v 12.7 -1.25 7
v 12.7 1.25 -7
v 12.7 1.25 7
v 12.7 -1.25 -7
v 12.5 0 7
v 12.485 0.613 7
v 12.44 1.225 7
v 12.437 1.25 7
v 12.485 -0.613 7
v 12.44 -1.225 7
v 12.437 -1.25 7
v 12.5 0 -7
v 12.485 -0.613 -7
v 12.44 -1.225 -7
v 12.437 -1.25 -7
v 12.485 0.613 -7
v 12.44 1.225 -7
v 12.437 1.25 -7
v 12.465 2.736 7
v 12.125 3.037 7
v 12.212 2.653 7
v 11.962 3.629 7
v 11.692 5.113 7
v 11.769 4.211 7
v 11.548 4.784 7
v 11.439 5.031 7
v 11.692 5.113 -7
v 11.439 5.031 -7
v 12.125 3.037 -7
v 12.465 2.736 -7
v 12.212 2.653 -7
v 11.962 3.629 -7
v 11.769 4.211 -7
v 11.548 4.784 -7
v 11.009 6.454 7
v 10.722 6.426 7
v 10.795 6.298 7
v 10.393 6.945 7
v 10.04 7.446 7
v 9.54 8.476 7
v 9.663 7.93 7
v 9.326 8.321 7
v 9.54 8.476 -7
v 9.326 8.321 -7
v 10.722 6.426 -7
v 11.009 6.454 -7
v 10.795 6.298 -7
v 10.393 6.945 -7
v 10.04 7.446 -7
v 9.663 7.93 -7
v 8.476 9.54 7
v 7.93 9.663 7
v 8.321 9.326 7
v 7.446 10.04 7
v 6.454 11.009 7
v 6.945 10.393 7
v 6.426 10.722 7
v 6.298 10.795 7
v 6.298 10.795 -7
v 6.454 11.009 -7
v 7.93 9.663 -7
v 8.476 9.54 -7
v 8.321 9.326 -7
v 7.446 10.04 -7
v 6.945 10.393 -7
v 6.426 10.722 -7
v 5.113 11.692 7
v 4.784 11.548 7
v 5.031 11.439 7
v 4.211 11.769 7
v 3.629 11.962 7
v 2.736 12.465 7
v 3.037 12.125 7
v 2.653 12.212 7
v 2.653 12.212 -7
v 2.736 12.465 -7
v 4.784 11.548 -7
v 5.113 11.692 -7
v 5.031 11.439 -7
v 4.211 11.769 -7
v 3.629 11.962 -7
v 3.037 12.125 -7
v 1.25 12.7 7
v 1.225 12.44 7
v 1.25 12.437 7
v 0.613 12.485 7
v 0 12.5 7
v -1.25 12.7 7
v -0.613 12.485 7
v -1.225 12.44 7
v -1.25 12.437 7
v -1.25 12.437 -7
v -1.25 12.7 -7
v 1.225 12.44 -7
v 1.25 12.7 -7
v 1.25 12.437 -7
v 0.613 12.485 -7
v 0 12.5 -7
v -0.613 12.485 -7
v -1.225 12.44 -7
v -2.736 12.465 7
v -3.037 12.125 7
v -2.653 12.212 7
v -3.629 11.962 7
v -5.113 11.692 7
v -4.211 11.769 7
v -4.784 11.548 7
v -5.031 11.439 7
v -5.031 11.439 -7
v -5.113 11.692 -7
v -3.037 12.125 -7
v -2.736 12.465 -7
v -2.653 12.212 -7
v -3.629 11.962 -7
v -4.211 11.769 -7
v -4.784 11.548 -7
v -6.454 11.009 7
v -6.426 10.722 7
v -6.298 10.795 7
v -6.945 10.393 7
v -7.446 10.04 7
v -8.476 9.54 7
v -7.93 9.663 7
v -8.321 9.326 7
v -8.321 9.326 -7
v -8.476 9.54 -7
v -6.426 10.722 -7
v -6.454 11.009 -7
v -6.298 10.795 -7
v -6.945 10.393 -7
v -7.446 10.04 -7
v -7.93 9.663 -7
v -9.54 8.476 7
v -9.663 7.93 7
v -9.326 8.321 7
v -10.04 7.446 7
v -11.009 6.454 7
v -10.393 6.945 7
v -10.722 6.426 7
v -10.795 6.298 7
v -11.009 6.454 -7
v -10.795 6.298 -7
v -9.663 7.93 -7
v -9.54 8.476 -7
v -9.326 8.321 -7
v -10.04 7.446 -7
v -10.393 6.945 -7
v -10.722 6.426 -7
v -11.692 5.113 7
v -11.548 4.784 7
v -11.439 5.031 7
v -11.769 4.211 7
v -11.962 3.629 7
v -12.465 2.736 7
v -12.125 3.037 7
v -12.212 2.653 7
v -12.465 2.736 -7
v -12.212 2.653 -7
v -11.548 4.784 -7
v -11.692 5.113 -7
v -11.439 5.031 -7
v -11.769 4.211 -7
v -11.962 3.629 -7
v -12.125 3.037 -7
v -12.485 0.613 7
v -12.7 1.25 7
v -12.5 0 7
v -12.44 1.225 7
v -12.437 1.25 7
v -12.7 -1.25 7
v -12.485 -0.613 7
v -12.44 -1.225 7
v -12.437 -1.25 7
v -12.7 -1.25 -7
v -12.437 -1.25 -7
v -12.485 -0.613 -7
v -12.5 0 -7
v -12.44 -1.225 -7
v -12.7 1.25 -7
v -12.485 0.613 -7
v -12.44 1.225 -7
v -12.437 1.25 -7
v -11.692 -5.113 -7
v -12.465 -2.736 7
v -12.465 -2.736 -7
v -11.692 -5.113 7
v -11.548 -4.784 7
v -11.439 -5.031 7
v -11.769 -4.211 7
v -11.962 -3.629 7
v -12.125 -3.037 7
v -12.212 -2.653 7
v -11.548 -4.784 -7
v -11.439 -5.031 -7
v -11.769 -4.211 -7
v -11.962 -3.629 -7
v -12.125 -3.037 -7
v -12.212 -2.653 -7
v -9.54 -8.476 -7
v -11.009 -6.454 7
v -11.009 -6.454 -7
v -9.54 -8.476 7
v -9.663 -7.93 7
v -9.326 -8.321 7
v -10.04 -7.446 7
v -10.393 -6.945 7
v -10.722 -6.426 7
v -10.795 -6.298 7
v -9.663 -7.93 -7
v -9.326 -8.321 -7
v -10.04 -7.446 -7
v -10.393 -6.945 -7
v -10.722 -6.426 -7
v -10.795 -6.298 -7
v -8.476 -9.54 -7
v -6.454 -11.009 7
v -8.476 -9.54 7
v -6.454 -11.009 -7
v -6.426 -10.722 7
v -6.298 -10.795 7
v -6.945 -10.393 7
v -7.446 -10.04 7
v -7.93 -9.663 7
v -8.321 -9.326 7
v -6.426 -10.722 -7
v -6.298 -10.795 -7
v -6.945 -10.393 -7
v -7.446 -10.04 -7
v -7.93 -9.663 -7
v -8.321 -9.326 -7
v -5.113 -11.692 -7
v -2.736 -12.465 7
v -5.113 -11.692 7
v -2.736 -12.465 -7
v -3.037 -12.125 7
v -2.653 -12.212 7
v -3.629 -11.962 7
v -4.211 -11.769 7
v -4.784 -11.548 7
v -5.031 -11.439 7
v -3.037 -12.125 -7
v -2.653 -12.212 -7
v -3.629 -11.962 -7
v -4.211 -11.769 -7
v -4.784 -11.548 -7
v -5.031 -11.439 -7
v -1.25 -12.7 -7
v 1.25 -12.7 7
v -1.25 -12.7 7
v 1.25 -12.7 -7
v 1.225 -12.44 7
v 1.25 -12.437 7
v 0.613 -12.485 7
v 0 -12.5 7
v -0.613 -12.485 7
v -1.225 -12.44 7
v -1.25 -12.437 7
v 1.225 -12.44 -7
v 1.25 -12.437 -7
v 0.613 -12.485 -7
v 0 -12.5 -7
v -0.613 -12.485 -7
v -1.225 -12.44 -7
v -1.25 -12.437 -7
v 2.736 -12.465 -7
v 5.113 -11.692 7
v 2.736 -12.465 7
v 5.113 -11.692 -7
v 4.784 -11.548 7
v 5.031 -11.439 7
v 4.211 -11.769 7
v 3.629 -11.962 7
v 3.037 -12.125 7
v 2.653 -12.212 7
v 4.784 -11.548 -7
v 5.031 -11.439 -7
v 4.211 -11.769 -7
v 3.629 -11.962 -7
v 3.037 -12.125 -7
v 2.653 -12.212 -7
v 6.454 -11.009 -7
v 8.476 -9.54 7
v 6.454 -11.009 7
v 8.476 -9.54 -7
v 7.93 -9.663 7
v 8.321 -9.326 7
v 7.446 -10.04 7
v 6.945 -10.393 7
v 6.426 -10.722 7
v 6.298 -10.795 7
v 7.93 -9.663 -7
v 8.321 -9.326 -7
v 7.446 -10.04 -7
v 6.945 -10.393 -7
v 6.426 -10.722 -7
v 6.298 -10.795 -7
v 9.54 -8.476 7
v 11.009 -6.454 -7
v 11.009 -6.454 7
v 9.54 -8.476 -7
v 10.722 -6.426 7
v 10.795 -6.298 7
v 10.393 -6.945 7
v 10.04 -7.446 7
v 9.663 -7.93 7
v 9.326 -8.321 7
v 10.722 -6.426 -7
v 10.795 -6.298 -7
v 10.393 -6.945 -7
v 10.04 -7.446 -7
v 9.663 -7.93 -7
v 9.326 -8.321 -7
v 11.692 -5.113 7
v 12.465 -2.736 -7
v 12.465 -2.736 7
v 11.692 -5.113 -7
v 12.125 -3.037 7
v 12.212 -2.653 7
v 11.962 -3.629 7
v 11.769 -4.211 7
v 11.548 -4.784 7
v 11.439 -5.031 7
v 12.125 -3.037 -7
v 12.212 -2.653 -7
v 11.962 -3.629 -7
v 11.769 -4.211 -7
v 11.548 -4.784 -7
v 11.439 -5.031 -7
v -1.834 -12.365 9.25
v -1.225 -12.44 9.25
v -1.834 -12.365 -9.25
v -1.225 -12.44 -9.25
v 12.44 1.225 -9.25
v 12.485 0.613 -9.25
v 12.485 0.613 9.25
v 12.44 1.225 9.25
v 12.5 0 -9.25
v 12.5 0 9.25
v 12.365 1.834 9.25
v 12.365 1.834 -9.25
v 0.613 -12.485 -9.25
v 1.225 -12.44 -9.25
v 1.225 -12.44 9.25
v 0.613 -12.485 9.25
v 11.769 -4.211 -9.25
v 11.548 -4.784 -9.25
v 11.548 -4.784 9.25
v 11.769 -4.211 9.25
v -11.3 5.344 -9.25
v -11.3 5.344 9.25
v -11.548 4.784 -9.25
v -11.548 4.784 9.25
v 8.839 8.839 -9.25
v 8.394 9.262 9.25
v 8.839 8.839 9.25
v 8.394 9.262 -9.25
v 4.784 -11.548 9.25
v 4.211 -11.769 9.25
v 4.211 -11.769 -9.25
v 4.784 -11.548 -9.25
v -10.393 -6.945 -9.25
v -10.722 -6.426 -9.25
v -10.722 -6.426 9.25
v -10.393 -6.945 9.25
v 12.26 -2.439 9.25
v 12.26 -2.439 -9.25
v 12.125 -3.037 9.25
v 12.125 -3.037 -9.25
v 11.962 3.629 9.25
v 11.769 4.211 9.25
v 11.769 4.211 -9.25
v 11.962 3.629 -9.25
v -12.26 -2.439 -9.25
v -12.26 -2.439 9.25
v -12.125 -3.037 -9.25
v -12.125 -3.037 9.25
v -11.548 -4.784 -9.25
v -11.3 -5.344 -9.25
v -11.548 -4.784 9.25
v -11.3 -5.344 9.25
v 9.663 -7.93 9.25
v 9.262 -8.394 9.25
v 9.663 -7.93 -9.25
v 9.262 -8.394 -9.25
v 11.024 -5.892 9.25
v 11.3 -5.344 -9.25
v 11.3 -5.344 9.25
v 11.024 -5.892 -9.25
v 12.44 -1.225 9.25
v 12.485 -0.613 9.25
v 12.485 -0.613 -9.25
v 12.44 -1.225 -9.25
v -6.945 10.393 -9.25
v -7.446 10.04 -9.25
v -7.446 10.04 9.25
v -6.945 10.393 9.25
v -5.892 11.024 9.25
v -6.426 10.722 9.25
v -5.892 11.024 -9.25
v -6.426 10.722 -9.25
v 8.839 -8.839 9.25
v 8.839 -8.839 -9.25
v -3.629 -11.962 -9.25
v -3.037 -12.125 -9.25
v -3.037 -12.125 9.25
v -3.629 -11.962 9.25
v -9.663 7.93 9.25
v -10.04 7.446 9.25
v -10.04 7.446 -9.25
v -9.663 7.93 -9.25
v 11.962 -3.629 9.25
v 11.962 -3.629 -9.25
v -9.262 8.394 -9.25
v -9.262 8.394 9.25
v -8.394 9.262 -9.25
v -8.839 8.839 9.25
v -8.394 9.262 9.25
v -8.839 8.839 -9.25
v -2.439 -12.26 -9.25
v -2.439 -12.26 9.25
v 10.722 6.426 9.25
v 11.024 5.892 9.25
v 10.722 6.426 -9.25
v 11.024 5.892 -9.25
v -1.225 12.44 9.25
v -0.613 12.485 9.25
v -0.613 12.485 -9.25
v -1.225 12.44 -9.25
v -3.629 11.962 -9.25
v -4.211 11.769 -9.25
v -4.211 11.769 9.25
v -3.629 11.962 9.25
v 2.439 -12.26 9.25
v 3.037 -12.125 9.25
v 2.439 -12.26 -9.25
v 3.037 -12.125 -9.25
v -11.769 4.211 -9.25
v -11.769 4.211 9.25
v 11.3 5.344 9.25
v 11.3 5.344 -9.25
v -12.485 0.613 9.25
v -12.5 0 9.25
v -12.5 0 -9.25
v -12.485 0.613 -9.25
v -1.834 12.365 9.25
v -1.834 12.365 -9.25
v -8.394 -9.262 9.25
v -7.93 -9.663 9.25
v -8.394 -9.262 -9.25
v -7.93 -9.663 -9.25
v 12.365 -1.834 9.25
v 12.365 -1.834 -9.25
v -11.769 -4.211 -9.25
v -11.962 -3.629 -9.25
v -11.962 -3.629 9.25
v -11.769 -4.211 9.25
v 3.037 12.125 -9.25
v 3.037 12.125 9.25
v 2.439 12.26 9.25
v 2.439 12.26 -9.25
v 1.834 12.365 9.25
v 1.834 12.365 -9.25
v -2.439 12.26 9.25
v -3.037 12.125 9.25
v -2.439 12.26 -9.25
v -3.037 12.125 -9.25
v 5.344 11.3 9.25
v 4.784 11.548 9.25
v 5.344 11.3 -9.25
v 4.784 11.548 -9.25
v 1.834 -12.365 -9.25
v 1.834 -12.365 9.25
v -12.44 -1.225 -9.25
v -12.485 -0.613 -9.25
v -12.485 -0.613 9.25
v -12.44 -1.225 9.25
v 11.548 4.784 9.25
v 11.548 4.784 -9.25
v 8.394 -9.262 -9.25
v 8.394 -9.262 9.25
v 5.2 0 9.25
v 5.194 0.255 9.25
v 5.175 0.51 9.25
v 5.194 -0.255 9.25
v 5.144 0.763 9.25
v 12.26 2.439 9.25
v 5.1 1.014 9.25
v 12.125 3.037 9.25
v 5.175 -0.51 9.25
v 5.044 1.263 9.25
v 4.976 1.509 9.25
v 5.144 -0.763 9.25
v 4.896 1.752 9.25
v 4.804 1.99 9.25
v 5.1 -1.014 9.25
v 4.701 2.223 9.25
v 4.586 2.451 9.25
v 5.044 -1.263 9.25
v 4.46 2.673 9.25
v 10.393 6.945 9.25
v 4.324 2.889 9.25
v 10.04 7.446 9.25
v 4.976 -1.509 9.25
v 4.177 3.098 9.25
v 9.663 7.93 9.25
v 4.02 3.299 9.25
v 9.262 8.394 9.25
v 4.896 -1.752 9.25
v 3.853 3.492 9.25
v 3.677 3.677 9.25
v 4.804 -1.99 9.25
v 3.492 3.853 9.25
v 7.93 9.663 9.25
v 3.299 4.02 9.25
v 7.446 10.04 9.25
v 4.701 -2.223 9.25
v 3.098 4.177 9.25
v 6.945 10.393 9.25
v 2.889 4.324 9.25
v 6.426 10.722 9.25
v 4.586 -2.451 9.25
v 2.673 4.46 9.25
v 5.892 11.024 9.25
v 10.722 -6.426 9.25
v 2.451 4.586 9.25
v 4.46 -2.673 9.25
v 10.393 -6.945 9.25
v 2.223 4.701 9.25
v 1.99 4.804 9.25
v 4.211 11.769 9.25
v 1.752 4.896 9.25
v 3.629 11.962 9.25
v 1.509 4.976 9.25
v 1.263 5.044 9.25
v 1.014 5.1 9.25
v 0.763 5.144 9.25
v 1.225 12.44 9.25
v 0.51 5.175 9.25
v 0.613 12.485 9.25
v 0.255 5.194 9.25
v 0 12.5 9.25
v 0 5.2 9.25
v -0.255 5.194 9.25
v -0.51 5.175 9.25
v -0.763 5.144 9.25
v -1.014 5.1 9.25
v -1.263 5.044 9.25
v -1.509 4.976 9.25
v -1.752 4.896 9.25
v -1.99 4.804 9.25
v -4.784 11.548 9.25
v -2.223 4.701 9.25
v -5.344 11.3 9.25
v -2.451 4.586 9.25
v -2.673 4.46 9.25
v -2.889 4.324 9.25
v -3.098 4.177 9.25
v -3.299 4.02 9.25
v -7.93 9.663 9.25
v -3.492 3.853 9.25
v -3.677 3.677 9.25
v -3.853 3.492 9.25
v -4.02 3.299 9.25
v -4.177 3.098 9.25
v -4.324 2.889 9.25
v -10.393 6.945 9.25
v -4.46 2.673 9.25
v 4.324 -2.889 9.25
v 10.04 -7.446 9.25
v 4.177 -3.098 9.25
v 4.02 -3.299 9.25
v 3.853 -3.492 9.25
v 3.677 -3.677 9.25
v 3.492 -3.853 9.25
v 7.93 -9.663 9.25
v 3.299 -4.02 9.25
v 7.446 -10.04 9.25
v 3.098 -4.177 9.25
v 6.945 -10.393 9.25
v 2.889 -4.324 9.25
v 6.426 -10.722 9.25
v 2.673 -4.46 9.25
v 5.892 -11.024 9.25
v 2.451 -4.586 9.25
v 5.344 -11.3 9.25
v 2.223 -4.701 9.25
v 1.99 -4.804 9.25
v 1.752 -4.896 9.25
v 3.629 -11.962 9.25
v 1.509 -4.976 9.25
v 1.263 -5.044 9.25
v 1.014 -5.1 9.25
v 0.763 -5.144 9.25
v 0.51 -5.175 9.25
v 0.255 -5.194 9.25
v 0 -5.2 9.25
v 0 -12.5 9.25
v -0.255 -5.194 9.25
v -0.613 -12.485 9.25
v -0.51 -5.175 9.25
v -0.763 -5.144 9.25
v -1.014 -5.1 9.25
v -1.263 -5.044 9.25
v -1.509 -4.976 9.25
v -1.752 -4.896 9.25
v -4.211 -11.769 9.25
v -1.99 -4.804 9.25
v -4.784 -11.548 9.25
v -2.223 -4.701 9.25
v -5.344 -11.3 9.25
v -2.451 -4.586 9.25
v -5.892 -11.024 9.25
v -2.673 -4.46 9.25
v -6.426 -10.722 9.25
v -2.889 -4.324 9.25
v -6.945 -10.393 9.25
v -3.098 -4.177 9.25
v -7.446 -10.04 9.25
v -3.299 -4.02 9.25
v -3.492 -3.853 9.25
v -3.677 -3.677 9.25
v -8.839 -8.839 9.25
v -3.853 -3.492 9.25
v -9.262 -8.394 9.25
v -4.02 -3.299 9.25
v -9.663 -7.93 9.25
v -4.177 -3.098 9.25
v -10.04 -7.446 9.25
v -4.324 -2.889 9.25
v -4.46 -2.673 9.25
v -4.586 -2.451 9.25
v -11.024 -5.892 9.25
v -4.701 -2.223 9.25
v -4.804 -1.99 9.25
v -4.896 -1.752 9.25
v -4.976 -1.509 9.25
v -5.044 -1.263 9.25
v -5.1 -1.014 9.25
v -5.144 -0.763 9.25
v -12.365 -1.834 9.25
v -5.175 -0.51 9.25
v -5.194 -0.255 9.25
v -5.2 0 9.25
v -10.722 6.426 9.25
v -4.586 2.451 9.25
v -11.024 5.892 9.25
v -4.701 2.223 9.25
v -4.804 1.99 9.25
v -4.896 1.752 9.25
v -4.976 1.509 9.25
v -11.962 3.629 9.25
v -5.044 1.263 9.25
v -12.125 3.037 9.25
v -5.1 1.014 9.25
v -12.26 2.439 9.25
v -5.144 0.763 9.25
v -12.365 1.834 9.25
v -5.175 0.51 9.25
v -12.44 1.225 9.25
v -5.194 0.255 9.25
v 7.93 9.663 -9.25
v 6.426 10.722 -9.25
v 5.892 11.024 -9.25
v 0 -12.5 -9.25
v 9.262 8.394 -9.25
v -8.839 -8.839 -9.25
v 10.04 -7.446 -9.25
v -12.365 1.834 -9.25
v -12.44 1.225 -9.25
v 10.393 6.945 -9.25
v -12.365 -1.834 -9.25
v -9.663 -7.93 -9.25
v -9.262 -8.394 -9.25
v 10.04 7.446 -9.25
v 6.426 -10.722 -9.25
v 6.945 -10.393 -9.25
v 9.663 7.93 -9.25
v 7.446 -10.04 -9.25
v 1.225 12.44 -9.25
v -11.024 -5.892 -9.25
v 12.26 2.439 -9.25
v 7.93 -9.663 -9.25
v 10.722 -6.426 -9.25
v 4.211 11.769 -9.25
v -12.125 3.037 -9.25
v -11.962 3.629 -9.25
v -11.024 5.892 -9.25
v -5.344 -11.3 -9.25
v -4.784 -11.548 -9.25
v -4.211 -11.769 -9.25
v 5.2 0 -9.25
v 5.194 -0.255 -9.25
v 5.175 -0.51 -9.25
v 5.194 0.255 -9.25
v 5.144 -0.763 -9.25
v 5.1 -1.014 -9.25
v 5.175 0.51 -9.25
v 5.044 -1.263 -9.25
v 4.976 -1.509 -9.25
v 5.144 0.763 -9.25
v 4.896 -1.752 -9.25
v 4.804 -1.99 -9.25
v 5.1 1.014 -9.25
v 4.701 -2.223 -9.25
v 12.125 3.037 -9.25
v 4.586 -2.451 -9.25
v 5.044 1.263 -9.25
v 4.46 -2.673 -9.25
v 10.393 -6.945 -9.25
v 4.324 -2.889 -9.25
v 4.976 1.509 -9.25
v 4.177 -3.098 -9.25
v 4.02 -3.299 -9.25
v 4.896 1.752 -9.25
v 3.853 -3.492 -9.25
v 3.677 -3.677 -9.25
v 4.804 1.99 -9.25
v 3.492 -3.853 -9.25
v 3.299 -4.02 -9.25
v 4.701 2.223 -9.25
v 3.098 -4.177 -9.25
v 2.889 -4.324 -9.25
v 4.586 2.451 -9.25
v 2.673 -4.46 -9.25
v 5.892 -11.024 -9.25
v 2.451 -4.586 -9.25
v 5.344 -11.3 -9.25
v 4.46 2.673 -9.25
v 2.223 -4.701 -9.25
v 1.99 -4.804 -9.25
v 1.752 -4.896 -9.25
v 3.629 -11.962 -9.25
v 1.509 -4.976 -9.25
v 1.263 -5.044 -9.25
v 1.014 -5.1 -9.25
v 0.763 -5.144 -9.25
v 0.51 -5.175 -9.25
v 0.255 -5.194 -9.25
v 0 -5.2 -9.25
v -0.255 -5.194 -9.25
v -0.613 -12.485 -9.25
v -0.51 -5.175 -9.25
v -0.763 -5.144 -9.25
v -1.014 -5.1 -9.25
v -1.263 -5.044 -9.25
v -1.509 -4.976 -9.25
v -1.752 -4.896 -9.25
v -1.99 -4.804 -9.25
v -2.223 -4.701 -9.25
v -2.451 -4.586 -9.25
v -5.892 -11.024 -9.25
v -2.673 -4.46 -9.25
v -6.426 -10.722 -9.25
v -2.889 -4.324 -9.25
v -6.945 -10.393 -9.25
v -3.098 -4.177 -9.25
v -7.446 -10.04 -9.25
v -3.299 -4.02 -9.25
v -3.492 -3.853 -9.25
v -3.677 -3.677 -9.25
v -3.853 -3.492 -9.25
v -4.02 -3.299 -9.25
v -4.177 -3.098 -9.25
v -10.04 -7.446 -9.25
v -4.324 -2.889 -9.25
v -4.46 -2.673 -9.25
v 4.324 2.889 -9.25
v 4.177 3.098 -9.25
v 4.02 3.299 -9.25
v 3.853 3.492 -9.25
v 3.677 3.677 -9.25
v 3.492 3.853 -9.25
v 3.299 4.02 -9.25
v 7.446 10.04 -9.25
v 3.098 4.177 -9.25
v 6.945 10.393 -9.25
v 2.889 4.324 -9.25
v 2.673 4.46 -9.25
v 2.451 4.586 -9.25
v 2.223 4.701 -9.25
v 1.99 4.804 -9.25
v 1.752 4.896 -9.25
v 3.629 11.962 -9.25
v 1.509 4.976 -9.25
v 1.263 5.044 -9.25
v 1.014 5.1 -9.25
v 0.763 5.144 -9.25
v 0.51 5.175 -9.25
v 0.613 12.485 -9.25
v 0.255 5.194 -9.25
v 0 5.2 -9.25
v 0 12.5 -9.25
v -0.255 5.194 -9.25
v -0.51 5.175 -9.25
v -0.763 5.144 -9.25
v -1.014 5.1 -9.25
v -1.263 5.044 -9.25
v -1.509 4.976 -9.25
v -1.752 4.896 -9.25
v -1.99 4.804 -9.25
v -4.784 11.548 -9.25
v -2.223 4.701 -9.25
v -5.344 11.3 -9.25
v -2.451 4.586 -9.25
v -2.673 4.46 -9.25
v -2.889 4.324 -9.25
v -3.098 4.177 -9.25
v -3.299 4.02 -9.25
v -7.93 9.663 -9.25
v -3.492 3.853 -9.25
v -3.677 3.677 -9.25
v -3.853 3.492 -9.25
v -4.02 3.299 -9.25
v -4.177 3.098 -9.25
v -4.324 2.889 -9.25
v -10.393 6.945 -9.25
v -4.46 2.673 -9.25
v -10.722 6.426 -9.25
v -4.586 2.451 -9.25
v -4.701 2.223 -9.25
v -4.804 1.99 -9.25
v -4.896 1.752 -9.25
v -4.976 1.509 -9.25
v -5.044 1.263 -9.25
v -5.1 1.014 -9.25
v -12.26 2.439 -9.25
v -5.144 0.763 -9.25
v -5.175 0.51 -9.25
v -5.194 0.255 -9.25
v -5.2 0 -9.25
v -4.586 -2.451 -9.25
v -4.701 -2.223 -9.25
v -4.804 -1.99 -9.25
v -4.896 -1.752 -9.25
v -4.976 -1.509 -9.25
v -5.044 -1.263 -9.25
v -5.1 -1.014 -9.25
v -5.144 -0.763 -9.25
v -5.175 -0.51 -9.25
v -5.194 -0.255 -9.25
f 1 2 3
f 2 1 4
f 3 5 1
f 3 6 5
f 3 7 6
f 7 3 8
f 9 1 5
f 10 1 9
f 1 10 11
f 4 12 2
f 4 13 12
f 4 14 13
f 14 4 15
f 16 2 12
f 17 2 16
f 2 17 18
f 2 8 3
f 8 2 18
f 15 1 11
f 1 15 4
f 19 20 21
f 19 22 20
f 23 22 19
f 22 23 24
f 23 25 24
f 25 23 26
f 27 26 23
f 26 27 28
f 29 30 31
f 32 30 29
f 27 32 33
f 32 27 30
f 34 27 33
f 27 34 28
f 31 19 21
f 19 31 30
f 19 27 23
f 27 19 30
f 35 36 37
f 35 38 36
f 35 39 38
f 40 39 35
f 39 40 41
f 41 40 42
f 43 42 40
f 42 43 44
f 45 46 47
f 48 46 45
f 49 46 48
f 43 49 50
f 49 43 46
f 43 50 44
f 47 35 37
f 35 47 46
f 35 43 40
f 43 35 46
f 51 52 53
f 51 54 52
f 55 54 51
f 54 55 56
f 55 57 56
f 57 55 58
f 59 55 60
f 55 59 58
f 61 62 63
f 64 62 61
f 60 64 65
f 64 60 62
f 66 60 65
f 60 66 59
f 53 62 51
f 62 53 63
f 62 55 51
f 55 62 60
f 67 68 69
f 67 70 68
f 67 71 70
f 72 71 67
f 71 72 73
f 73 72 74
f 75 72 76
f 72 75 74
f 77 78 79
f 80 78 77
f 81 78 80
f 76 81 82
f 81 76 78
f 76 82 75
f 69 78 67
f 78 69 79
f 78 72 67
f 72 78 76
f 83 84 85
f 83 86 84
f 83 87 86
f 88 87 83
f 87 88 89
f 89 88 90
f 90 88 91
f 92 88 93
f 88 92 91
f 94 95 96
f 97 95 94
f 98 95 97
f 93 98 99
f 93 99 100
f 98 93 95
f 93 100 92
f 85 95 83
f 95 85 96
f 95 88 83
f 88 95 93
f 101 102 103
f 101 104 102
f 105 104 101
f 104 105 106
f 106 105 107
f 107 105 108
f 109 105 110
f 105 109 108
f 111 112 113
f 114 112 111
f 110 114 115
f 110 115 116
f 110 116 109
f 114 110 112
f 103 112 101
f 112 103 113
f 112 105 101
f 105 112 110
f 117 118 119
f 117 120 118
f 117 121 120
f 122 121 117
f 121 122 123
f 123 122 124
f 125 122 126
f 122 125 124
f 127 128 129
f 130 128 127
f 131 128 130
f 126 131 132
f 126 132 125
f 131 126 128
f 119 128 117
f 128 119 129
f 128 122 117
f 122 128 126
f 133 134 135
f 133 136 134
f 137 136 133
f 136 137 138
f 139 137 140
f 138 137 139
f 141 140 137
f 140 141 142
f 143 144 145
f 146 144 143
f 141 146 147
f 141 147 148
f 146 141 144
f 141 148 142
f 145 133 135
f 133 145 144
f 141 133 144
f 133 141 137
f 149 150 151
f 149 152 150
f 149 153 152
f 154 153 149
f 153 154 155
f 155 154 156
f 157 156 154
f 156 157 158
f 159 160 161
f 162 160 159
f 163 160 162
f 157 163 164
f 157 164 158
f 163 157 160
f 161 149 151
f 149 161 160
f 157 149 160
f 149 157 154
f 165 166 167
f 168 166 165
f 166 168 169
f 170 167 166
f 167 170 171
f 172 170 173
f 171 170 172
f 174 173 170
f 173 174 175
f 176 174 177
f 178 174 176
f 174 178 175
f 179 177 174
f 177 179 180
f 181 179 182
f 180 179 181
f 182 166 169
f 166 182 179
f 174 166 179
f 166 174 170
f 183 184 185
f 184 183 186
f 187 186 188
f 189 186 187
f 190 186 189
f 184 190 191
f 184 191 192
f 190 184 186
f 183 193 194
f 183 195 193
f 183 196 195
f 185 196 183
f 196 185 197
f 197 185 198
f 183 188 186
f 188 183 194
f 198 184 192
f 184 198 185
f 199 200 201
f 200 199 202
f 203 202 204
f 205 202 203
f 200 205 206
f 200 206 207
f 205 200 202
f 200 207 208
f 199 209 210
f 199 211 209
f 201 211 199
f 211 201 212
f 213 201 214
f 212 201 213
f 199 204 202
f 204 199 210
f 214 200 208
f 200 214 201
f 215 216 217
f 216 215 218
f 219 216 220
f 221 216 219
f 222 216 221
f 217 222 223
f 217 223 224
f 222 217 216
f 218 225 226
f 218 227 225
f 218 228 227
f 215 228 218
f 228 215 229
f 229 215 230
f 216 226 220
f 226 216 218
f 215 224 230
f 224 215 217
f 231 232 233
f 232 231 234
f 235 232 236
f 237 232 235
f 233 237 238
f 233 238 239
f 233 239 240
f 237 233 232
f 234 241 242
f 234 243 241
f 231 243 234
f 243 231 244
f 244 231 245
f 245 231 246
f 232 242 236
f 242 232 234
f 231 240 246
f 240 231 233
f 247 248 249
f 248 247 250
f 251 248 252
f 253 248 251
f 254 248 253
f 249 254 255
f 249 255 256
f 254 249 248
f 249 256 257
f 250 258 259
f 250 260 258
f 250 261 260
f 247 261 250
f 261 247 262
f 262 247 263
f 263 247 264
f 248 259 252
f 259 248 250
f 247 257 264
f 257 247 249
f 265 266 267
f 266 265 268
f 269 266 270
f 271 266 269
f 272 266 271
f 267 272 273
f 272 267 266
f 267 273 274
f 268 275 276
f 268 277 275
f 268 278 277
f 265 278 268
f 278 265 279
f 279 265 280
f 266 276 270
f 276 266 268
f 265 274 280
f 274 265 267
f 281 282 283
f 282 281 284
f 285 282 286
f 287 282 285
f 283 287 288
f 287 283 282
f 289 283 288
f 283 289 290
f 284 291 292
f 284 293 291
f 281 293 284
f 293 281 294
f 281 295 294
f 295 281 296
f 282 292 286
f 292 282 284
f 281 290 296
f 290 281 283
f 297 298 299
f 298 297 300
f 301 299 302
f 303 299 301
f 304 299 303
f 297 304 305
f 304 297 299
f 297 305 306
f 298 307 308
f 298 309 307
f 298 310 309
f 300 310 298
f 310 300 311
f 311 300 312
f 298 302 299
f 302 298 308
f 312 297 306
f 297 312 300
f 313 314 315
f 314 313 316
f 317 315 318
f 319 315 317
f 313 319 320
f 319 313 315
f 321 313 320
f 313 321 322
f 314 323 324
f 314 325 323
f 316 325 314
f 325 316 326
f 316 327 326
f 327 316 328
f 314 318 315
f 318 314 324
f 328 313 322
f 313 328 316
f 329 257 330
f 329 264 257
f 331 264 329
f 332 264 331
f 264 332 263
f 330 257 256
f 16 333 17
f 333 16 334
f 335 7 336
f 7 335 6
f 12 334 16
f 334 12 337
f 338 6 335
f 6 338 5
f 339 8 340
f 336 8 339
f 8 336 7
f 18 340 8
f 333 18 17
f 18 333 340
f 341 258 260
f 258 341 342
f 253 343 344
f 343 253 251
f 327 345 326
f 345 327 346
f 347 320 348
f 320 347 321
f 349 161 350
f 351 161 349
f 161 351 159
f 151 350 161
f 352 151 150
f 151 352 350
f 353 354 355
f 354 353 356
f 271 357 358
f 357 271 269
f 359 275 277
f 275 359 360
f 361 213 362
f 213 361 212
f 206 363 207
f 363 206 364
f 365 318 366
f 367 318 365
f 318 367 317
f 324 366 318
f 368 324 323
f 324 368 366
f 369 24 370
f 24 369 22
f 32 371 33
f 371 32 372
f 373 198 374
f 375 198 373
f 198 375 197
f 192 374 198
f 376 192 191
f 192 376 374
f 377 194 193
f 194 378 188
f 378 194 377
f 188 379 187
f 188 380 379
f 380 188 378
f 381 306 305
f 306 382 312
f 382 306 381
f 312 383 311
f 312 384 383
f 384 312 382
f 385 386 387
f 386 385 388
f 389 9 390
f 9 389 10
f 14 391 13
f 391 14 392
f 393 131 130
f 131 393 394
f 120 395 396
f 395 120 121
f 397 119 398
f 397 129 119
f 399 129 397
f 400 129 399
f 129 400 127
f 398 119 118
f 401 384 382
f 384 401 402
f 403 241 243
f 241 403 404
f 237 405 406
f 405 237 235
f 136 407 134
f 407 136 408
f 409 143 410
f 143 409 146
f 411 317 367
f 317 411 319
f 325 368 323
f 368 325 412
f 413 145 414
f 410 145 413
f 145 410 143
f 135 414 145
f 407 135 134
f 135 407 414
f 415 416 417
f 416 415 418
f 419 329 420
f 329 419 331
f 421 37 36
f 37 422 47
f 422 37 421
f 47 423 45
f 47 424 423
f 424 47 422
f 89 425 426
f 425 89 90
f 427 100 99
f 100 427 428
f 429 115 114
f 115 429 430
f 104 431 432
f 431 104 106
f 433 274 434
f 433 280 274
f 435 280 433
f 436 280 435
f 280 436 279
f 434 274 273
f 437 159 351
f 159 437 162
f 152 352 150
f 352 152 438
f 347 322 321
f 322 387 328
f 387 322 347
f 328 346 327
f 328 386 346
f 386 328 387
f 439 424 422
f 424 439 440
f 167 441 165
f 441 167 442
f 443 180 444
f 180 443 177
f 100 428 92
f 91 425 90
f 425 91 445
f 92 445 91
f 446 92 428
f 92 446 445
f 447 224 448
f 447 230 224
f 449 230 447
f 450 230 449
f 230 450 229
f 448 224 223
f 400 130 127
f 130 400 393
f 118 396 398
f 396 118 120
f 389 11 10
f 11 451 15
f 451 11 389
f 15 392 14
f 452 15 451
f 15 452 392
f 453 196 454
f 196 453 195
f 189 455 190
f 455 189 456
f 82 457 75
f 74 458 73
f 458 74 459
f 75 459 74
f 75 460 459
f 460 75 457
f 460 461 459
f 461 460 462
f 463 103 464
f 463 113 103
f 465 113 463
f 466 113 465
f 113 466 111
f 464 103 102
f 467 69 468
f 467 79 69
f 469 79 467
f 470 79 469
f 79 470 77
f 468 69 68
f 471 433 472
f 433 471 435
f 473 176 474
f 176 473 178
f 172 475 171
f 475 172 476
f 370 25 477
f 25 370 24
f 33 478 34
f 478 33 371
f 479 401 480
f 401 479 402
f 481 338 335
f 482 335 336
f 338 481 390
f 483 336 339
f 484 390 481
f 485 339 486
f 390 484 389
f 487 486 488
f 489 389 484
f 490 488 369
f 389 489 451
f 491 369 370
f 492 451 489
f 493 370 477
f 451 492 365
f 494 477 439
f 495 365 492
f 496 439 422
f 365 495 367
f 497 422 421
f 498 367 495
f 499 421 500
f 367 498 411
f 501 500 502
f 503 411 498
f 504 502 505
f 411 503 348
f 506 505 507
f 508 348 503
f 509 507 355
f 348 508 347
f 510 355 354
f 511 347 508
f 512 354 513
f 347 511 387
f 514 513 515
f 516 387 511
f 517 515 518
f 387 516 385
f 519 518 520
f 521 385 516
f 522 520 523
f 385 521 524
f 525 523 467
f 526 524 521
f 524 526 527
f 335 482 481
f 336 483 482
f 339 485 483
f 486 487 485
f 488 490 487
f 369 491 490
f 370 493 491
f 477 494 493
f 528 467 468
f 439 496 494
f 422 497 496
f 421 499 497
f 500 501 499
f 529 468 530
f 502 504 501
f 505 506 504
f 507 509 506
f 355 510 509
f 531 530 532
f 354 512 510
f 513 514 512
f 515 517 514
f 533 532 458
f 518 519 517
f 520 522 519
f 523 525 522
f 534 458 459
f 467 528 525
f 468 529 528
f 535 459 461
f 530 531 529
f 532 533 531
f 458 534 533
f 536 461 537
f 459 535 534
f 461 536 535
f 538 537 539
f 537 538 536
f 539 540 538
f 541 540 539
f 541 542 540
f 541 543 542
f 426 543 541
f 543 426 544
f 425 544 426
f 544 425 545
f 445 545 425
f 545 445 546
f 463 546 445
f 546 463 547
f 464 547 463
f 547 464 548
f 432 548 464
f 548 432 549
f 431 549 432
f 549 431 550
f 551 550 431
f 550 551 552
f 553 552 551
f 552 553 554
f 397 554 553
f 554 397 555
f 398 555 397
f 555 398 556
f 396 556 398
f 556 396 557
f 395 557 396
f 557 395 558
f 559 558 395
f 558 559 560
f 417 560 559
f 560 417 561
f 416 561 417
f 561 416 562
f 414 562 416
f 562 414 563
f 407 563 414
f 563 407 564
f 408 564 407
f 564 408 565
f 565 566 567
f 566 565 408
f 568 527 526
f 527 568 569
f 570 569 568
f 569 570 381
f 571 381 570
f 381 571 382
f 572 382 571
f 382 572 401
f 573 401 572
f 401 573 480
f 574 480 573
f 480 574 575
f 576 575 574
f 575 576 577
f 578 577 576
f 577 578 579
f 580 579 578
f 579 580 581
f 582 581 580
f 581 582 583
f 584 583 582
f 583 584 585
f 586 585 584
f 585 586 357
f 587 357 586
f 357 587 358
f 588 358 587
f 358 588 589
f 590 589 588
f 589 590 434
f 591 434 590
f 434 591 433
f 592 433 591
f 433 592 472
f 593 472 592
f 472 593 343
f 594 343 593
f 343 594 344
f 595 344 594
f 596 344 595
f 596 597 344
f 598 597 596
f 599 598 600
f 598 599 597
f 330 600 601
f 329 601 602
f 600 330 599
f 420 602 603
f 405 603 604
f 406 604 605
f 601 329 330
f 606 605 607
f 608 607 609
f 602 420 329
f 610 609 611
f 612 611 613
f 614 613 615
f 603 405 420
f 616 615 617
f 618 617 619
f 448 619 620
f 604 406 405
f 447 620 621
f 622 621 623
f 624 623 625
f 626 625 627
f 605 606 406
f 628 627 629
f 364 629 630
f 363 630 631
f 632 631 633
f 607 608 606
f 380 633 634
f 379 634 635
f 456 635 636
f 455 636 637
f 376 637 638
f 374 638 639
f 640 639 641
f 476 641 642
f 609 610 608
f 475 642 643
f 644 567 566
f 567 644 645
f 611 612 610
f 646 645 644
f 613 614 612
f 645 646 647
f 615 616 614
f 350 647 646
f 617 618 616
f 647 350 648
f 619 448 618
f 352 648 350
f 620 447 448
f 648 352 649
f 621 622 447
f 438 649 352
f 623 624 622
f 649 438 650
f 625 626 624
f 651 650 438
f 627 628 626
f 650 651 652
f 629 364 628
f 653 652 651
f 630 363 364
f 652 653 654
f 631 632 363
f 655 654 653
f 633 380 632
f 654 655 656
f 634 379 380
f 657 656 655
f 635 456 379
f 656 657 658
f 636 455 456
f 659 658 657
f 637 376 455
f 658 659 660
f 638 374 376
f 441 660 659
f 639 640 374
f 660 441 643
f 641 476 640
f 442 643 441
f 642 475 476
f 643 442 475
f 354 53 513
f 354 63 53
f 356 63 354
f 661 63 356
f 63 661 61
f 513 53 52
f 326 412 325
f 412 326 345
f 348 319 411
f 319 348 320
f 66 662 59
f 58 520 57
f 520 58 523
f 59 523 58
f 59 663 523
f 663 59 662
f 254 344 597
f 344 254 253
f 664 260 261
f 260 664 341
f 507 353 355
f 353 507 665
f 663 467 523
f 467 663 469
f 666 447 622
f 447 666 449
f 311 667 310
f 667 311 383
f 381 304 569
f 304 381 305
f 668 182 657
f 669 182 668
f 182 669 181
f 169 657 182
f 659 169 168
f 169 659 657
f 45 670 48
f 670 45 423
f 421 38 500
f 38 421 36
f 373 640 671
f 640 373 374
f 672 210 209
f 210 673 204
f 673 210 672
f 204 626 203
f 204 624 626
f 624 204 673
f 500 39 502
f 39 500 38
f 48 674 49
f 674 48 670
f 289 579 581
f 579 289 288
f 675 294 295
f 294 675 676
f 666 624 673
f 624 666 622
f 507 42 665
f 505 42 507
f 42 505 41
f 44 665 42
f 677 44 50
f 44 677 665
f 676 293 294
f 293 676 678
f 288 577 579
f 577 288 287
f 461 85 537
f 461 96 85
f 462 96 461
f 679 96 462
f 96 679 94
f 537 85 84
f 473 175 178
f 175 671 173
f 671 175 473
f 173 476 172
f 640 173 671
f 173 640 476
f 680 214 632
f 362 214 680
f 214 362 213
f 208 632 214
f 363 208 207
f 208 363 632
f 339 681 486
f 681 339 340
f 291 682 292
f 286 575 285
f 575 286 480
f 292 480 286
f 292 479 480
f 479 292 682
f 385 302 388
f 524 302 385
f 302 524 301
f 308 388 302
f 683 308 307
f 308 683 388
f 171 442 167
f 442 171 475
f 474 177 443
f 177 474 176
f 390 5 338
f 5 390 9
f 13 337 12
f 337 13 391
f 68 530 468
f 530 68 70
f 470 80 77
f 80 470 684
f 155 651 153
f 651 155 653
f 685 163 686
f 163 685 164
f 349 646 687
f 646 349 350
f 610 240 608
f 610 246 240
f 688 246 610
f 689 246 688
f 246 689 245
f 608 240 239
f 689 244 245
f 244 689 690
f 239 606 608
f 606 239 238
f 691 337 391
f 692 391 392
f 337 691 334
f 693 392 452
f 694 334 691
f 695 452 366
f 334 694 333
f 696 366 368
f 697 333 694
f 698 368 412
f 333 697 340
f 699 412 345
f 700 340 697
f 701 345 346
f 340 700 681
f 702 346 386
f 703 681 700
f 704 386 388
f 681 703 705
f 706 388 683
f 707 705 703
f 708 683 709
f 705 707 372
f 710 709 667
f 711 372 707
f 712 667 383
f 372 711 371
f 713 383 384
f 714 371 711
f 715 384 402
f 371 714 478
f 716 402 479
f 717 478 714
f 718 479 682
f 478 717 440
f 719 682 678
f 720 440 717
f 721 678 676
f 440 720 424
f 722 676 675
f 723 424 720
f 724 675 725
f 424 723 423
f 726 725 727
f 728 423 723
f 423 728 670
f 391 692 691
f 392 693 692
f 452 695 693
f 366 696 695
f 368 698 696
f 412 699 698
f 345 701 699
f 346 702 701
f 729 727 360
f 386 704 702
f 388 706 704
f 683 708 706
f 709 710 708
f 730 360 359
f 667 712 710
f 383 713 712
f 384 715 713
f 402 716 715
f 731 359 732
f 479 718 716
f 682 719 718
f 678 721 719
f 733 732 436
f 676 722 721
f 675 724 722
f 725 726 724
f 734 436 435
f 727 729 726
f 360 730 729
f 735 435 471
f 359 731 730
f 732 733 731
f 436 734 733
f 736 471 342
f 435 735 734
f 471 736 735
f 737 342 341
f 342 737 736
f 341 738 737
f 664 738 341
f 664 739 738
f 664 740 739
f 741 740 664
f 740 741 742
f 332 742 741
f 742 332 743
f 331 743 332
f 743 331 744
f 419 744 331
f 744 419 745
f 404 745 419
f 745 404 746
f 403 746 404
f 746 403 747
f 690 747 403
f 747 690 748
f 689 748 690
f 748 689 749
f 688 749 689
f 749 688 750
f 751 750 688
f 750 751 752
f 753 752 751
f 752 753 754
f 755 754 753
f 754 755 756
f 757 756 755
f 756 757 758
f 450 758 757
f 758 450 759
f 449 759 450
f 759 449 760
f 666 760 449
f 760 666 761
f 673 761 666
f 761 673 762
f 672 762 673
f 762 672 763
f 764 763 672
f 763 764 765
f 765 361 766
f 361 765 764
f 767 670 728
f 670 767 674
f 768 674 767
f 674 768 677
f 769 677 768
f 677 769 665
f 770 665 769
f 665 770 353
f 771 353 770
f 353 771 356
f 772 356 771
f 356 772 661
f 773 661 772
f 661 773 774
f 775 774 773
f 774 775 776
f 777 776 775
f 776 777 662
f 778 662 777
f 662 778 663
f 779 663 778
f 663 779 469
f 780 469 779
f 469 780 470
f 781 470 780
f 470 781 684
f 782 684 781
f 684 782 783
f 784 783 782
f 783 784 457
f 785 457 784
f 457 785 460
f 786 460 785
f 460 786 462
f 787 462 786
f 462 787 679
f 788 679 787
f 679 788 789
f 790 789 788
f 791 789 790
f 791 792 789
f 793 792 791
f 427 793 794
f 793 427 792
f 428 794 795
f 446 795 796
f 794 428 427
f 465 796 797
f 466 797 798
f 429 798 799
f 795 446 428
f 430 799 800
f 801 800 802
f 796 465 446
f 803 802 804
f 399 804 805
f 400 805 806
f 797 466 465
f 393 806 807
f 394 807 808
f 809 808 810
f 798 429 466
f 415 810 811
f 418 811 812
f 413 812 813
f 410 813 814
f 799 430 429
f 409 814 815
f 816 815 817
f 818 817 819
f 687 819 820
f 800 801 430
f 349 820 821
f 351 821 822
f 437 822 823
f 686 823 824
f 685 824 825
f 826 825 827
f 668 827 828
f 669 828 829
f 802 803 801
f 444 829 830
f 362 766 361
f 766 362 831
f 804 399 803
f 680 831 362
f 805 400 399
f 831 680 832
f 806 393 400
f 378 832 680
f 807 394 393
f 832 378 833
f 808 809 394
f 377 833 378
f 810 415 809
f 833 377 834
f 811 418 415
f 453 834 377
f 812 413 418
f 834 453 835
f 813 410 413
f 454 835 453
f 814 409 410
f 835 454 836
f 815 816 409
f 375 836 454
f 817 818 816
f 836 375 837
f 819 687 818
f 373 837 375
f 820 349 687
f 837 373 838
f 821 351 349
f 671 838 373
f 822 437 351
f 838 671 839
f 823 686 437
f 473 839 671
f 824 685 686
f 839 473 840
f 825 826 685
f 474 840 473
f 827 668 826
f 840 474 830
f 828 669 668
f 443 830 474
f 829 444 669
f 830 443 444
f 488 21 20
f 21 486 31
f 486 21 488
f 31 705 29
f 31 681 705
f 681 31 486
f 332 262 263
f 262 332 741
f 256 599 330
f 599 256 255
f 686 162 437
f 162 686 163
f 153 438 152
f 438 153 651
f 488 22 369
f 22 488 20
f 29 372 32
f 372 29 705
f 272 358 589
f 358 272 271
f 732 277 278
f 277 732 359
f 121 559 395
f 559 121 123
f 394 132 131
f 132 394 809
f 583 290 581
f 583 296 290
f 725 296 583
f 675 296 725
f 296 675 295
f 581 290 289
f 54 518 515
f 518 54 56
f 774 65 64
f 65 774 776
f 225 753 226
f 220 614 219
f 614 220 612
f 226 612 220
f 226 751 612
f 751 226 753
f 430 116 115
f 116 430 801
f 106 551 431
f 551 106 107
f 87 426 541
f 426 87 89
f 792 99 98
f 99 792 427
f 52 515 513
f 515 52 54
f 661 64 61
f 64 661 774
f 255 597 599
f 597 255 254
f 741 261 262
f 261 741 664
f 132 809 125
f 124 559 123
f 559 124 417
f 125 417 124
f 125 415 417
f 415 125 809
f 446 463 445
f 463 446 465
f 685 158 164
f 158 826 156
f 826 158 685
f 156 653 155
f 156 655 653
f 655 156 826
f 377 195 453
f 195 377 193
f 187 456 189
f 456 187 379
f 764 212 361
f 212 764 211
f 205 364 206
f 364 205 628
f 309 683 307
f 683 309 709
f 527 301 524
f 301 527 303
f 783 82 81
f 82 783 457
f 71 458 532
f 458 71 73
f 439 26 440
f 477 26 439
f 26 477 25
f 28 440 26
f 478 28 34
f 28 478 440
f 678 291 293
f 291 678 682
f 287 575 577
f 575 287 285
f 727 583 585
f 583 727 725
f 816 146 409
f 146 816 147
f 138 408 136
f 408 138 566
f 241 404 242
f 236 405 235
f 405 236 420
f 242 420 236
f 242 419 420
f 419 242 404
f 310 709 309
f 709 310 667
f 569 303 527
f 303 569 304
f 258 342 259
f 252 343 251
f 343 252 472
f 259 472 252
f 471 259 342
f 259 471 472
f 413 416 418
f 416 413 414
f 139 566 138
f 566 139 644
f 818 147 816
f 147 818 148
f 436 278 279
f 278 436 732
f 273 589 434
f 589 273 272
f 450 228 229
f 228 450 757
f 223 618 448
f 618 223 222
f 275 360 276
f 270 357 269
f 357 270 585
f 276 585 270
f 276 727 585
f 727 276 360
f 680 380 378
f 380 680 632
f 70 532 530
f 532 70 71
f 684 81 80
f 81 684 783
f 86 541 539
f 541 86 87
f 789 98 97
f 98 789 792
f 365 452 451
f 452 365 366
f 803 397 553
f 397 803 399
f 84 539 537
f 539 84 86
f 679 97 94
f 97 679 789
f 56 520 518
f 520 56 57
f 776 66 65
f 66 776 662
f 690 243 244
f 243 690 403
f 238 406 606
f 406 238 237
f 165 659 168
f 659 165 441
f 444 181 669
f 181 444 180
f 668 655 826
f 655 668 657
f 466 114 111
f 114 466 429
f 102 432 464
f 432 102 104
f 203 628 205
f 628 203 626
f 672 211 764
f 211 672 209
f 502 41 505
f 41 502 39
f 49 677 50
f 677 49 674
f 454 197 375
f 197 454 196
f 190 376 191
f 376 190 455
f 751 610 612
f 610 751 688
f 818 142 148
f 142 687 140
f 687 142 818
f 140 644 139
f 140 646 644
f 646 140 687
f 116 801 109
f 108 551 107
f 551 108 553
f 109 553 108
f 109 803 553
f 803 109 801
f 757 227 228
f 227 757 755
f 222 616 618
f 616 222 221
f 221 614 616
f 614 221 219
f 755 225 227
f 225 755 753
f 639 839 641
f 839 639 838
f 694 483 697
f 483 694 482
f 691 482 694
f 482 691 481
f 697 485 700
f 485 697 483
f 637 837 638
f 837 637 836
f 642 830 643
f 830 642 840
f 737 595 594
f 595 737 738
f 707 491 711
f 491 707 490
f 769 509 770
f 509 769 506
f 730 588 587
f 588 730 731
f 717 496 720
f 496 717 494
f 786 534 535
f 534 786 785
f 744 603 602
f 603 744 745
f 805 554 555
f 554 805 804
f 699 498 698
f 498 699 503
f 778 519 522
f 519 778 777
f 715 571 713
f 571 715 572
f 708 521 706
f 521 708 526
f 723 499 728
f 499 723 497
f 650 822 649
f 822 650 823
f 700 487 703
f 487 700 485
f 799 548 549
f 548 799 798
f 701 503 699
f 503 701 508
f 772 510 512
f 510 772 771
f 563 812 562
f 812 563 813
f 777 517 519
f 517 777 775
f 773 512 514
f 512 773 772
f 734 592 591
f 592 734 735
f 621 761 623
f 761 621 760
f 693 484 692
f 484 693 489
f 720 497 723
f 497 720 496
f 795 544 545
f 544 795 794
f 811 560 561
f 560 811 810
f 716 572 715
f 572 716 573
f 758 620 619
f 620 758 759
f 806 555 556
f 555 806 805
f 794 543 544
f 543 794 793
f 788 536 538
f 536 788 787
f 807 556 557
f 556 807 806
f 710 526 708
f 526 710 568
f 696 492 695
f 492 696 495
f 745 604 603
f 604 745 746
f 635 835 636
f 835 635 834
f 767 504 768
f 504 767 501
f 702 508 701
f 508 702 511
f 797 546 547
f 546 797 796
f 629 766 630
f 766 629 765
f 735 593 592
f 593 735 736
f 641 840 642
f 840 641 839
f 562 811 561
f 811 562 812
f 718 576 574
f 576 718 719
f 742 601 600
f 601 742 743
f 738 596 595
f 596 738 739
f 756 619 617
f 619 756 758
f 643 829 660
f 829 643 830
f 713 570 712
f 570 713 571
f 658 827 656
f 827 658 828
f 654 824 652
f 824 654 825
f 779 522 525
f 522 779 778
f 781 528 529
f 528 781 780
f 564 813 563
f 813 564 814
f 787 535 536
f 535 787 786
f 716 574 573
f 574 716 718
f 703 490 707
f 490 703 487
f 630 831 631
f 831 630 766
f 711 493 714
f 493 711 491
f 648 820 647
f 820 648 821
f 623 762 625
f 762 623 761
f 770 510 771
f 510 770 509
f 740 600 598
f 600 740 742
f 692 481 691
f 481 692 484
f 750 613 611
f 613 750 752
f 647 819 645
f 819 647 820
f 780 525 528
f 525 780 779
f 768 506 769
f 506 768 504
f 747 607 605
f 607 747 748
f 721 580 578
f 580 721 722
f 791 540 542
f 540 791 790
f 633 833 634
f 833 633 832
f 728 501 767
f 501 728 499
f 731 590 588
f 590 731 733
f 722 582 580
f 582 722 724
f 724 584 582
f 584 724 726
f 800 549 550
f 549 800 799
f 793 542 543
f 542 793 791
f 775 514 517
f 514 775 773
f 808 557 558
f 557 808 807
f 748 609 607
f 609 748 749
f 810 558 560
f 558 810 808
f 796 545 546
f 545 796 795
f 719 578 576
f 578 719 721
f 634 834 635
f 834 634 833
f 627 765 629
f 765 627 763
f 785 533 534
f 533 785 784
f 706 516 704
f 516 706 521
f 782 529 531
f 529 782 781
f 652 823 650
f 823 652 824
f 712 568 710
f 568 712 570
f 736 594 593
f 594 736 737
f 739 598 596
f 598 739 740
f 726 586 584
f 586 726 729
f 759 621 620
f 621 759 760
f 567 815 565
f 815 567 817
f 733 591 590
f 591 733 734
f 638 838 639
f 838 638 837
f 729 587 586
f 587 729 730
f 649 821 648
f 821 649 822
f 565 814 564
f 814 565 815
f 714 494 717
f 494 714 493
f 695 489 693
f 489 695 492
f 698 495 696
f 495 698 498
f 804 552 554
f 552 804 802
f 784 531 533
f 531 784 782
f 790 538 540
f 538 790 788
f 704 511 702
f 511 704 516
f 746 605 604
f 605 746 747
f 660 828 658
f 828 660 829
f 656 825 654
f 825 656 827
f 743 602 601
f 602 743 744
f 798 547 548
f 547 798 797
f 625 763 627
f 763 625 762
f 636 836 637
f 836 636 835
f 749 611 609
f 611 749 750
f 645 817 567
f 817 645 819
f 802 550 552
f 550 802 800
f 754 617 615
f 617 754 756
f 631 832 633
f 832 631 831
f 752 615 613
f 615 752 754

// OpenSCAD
// Threaded heat-set insert (simplified geometry)
// Target: 25.0mm OD, 18.5mm long, for 10.0mm screws

outer_diameter = 25; //[12.5:50:0.1]
length = 18.5; //[9.25:37:0.1]
screw_diameter = 10; //[5:20:0.1]
thread_pitch = 1.5; //[0.75:3:0.05]  // (not modeled; kept for UI)
inner_clearance = 0.4; //[0.1:1:0.05]
end_chamfer_height = 2; //[1:4:0.1]
end_chamfer_angle_deg = 45; //[20:70:1] // (not used directly; height controls chamfer)
knurl_depth = 1; //[0.5:2:0.1]
knurl_pitch = 4; //[2:8:0.1] // (not used directly; count controls spacing)
knurl_rib_width = 2.5; //[1.5:5:0.1]
knurl_rib_height = 14; //[8:18:0.1]
knurl_count = 20; //[8:40:1]
overlap = 0.8; //[0.2:2:0.1]

$fn = 128;

module threaded_insert() {
  outer_r = outer_diameter/2;
  inner_r = (screw_diameter + inner_clearance)/2;

  // Keep chamfers valid and within length
  chamfer_h = min(end_chamfer_height, length/2 - 0.01);
  chamfer_h_safe = max(0.01, chamfer_h);

  // Knurl ribs stay within the straight section between chamfers
  straight_h = max(0.01, length - 2*chamfer_h_safe);
  rib_h = min(knurl_rib_height, straight_h);
  rib_h_safe = max(0.01, rib_h);

  // Center ribs in the straight section
  rib_z = 0;

  // Ensure ribs protrude outward but overlap into the body for connectivity
  // Inner face of rib at (outer_r - overlap), outer face at (outer_r - overlap + knurl_depth)
  rib_center_r = (outer_r - overlap) + knurl_depth/2;

  // Ensure the hole doesn't erase the entire part
  inner_r_safe = min(inner_r, outer_r - 0.5);

  color("Brass")
  difference() {
    union() {
      // Main body
      cylinder(r=outer_r, h=length, center=true);

      // End chamfers (slight overlap into main body to avoid coplanar artifacts)
      translate([0, 0,  length/2 - chamfer_h_safe/2 - overlap/2])
        cylinder(r1=outer_r, r2=max(0.01, outer_r - chamfer_h_safe),
                 h=chamfer_h_safe, center=true);

      translate([0, 0, -length/2 + chamfer_h_safe/2 + overlap/2])
        cylinder(r1=max(0.01, outer_r - chamfer_h_safe), r2=outer_r,
                 h=chamfer_h_safe, center=true);

      // Knurl ribs
      for (i = [0:knurl_count-1]) {
        rotate([0, 0, i*360/knurl_count])
          translate([rib_center_r, 0, rib_z])
            cube([knurl_depth, knurl_rib_width, rib_h_safe], center=true);
      }
    }

    // Through-hole for screw (thread not modeled)
    cylinder(r=inner_r_safe, h=length + 2*overlap, center=true);
  }
}

threaded_insert();
